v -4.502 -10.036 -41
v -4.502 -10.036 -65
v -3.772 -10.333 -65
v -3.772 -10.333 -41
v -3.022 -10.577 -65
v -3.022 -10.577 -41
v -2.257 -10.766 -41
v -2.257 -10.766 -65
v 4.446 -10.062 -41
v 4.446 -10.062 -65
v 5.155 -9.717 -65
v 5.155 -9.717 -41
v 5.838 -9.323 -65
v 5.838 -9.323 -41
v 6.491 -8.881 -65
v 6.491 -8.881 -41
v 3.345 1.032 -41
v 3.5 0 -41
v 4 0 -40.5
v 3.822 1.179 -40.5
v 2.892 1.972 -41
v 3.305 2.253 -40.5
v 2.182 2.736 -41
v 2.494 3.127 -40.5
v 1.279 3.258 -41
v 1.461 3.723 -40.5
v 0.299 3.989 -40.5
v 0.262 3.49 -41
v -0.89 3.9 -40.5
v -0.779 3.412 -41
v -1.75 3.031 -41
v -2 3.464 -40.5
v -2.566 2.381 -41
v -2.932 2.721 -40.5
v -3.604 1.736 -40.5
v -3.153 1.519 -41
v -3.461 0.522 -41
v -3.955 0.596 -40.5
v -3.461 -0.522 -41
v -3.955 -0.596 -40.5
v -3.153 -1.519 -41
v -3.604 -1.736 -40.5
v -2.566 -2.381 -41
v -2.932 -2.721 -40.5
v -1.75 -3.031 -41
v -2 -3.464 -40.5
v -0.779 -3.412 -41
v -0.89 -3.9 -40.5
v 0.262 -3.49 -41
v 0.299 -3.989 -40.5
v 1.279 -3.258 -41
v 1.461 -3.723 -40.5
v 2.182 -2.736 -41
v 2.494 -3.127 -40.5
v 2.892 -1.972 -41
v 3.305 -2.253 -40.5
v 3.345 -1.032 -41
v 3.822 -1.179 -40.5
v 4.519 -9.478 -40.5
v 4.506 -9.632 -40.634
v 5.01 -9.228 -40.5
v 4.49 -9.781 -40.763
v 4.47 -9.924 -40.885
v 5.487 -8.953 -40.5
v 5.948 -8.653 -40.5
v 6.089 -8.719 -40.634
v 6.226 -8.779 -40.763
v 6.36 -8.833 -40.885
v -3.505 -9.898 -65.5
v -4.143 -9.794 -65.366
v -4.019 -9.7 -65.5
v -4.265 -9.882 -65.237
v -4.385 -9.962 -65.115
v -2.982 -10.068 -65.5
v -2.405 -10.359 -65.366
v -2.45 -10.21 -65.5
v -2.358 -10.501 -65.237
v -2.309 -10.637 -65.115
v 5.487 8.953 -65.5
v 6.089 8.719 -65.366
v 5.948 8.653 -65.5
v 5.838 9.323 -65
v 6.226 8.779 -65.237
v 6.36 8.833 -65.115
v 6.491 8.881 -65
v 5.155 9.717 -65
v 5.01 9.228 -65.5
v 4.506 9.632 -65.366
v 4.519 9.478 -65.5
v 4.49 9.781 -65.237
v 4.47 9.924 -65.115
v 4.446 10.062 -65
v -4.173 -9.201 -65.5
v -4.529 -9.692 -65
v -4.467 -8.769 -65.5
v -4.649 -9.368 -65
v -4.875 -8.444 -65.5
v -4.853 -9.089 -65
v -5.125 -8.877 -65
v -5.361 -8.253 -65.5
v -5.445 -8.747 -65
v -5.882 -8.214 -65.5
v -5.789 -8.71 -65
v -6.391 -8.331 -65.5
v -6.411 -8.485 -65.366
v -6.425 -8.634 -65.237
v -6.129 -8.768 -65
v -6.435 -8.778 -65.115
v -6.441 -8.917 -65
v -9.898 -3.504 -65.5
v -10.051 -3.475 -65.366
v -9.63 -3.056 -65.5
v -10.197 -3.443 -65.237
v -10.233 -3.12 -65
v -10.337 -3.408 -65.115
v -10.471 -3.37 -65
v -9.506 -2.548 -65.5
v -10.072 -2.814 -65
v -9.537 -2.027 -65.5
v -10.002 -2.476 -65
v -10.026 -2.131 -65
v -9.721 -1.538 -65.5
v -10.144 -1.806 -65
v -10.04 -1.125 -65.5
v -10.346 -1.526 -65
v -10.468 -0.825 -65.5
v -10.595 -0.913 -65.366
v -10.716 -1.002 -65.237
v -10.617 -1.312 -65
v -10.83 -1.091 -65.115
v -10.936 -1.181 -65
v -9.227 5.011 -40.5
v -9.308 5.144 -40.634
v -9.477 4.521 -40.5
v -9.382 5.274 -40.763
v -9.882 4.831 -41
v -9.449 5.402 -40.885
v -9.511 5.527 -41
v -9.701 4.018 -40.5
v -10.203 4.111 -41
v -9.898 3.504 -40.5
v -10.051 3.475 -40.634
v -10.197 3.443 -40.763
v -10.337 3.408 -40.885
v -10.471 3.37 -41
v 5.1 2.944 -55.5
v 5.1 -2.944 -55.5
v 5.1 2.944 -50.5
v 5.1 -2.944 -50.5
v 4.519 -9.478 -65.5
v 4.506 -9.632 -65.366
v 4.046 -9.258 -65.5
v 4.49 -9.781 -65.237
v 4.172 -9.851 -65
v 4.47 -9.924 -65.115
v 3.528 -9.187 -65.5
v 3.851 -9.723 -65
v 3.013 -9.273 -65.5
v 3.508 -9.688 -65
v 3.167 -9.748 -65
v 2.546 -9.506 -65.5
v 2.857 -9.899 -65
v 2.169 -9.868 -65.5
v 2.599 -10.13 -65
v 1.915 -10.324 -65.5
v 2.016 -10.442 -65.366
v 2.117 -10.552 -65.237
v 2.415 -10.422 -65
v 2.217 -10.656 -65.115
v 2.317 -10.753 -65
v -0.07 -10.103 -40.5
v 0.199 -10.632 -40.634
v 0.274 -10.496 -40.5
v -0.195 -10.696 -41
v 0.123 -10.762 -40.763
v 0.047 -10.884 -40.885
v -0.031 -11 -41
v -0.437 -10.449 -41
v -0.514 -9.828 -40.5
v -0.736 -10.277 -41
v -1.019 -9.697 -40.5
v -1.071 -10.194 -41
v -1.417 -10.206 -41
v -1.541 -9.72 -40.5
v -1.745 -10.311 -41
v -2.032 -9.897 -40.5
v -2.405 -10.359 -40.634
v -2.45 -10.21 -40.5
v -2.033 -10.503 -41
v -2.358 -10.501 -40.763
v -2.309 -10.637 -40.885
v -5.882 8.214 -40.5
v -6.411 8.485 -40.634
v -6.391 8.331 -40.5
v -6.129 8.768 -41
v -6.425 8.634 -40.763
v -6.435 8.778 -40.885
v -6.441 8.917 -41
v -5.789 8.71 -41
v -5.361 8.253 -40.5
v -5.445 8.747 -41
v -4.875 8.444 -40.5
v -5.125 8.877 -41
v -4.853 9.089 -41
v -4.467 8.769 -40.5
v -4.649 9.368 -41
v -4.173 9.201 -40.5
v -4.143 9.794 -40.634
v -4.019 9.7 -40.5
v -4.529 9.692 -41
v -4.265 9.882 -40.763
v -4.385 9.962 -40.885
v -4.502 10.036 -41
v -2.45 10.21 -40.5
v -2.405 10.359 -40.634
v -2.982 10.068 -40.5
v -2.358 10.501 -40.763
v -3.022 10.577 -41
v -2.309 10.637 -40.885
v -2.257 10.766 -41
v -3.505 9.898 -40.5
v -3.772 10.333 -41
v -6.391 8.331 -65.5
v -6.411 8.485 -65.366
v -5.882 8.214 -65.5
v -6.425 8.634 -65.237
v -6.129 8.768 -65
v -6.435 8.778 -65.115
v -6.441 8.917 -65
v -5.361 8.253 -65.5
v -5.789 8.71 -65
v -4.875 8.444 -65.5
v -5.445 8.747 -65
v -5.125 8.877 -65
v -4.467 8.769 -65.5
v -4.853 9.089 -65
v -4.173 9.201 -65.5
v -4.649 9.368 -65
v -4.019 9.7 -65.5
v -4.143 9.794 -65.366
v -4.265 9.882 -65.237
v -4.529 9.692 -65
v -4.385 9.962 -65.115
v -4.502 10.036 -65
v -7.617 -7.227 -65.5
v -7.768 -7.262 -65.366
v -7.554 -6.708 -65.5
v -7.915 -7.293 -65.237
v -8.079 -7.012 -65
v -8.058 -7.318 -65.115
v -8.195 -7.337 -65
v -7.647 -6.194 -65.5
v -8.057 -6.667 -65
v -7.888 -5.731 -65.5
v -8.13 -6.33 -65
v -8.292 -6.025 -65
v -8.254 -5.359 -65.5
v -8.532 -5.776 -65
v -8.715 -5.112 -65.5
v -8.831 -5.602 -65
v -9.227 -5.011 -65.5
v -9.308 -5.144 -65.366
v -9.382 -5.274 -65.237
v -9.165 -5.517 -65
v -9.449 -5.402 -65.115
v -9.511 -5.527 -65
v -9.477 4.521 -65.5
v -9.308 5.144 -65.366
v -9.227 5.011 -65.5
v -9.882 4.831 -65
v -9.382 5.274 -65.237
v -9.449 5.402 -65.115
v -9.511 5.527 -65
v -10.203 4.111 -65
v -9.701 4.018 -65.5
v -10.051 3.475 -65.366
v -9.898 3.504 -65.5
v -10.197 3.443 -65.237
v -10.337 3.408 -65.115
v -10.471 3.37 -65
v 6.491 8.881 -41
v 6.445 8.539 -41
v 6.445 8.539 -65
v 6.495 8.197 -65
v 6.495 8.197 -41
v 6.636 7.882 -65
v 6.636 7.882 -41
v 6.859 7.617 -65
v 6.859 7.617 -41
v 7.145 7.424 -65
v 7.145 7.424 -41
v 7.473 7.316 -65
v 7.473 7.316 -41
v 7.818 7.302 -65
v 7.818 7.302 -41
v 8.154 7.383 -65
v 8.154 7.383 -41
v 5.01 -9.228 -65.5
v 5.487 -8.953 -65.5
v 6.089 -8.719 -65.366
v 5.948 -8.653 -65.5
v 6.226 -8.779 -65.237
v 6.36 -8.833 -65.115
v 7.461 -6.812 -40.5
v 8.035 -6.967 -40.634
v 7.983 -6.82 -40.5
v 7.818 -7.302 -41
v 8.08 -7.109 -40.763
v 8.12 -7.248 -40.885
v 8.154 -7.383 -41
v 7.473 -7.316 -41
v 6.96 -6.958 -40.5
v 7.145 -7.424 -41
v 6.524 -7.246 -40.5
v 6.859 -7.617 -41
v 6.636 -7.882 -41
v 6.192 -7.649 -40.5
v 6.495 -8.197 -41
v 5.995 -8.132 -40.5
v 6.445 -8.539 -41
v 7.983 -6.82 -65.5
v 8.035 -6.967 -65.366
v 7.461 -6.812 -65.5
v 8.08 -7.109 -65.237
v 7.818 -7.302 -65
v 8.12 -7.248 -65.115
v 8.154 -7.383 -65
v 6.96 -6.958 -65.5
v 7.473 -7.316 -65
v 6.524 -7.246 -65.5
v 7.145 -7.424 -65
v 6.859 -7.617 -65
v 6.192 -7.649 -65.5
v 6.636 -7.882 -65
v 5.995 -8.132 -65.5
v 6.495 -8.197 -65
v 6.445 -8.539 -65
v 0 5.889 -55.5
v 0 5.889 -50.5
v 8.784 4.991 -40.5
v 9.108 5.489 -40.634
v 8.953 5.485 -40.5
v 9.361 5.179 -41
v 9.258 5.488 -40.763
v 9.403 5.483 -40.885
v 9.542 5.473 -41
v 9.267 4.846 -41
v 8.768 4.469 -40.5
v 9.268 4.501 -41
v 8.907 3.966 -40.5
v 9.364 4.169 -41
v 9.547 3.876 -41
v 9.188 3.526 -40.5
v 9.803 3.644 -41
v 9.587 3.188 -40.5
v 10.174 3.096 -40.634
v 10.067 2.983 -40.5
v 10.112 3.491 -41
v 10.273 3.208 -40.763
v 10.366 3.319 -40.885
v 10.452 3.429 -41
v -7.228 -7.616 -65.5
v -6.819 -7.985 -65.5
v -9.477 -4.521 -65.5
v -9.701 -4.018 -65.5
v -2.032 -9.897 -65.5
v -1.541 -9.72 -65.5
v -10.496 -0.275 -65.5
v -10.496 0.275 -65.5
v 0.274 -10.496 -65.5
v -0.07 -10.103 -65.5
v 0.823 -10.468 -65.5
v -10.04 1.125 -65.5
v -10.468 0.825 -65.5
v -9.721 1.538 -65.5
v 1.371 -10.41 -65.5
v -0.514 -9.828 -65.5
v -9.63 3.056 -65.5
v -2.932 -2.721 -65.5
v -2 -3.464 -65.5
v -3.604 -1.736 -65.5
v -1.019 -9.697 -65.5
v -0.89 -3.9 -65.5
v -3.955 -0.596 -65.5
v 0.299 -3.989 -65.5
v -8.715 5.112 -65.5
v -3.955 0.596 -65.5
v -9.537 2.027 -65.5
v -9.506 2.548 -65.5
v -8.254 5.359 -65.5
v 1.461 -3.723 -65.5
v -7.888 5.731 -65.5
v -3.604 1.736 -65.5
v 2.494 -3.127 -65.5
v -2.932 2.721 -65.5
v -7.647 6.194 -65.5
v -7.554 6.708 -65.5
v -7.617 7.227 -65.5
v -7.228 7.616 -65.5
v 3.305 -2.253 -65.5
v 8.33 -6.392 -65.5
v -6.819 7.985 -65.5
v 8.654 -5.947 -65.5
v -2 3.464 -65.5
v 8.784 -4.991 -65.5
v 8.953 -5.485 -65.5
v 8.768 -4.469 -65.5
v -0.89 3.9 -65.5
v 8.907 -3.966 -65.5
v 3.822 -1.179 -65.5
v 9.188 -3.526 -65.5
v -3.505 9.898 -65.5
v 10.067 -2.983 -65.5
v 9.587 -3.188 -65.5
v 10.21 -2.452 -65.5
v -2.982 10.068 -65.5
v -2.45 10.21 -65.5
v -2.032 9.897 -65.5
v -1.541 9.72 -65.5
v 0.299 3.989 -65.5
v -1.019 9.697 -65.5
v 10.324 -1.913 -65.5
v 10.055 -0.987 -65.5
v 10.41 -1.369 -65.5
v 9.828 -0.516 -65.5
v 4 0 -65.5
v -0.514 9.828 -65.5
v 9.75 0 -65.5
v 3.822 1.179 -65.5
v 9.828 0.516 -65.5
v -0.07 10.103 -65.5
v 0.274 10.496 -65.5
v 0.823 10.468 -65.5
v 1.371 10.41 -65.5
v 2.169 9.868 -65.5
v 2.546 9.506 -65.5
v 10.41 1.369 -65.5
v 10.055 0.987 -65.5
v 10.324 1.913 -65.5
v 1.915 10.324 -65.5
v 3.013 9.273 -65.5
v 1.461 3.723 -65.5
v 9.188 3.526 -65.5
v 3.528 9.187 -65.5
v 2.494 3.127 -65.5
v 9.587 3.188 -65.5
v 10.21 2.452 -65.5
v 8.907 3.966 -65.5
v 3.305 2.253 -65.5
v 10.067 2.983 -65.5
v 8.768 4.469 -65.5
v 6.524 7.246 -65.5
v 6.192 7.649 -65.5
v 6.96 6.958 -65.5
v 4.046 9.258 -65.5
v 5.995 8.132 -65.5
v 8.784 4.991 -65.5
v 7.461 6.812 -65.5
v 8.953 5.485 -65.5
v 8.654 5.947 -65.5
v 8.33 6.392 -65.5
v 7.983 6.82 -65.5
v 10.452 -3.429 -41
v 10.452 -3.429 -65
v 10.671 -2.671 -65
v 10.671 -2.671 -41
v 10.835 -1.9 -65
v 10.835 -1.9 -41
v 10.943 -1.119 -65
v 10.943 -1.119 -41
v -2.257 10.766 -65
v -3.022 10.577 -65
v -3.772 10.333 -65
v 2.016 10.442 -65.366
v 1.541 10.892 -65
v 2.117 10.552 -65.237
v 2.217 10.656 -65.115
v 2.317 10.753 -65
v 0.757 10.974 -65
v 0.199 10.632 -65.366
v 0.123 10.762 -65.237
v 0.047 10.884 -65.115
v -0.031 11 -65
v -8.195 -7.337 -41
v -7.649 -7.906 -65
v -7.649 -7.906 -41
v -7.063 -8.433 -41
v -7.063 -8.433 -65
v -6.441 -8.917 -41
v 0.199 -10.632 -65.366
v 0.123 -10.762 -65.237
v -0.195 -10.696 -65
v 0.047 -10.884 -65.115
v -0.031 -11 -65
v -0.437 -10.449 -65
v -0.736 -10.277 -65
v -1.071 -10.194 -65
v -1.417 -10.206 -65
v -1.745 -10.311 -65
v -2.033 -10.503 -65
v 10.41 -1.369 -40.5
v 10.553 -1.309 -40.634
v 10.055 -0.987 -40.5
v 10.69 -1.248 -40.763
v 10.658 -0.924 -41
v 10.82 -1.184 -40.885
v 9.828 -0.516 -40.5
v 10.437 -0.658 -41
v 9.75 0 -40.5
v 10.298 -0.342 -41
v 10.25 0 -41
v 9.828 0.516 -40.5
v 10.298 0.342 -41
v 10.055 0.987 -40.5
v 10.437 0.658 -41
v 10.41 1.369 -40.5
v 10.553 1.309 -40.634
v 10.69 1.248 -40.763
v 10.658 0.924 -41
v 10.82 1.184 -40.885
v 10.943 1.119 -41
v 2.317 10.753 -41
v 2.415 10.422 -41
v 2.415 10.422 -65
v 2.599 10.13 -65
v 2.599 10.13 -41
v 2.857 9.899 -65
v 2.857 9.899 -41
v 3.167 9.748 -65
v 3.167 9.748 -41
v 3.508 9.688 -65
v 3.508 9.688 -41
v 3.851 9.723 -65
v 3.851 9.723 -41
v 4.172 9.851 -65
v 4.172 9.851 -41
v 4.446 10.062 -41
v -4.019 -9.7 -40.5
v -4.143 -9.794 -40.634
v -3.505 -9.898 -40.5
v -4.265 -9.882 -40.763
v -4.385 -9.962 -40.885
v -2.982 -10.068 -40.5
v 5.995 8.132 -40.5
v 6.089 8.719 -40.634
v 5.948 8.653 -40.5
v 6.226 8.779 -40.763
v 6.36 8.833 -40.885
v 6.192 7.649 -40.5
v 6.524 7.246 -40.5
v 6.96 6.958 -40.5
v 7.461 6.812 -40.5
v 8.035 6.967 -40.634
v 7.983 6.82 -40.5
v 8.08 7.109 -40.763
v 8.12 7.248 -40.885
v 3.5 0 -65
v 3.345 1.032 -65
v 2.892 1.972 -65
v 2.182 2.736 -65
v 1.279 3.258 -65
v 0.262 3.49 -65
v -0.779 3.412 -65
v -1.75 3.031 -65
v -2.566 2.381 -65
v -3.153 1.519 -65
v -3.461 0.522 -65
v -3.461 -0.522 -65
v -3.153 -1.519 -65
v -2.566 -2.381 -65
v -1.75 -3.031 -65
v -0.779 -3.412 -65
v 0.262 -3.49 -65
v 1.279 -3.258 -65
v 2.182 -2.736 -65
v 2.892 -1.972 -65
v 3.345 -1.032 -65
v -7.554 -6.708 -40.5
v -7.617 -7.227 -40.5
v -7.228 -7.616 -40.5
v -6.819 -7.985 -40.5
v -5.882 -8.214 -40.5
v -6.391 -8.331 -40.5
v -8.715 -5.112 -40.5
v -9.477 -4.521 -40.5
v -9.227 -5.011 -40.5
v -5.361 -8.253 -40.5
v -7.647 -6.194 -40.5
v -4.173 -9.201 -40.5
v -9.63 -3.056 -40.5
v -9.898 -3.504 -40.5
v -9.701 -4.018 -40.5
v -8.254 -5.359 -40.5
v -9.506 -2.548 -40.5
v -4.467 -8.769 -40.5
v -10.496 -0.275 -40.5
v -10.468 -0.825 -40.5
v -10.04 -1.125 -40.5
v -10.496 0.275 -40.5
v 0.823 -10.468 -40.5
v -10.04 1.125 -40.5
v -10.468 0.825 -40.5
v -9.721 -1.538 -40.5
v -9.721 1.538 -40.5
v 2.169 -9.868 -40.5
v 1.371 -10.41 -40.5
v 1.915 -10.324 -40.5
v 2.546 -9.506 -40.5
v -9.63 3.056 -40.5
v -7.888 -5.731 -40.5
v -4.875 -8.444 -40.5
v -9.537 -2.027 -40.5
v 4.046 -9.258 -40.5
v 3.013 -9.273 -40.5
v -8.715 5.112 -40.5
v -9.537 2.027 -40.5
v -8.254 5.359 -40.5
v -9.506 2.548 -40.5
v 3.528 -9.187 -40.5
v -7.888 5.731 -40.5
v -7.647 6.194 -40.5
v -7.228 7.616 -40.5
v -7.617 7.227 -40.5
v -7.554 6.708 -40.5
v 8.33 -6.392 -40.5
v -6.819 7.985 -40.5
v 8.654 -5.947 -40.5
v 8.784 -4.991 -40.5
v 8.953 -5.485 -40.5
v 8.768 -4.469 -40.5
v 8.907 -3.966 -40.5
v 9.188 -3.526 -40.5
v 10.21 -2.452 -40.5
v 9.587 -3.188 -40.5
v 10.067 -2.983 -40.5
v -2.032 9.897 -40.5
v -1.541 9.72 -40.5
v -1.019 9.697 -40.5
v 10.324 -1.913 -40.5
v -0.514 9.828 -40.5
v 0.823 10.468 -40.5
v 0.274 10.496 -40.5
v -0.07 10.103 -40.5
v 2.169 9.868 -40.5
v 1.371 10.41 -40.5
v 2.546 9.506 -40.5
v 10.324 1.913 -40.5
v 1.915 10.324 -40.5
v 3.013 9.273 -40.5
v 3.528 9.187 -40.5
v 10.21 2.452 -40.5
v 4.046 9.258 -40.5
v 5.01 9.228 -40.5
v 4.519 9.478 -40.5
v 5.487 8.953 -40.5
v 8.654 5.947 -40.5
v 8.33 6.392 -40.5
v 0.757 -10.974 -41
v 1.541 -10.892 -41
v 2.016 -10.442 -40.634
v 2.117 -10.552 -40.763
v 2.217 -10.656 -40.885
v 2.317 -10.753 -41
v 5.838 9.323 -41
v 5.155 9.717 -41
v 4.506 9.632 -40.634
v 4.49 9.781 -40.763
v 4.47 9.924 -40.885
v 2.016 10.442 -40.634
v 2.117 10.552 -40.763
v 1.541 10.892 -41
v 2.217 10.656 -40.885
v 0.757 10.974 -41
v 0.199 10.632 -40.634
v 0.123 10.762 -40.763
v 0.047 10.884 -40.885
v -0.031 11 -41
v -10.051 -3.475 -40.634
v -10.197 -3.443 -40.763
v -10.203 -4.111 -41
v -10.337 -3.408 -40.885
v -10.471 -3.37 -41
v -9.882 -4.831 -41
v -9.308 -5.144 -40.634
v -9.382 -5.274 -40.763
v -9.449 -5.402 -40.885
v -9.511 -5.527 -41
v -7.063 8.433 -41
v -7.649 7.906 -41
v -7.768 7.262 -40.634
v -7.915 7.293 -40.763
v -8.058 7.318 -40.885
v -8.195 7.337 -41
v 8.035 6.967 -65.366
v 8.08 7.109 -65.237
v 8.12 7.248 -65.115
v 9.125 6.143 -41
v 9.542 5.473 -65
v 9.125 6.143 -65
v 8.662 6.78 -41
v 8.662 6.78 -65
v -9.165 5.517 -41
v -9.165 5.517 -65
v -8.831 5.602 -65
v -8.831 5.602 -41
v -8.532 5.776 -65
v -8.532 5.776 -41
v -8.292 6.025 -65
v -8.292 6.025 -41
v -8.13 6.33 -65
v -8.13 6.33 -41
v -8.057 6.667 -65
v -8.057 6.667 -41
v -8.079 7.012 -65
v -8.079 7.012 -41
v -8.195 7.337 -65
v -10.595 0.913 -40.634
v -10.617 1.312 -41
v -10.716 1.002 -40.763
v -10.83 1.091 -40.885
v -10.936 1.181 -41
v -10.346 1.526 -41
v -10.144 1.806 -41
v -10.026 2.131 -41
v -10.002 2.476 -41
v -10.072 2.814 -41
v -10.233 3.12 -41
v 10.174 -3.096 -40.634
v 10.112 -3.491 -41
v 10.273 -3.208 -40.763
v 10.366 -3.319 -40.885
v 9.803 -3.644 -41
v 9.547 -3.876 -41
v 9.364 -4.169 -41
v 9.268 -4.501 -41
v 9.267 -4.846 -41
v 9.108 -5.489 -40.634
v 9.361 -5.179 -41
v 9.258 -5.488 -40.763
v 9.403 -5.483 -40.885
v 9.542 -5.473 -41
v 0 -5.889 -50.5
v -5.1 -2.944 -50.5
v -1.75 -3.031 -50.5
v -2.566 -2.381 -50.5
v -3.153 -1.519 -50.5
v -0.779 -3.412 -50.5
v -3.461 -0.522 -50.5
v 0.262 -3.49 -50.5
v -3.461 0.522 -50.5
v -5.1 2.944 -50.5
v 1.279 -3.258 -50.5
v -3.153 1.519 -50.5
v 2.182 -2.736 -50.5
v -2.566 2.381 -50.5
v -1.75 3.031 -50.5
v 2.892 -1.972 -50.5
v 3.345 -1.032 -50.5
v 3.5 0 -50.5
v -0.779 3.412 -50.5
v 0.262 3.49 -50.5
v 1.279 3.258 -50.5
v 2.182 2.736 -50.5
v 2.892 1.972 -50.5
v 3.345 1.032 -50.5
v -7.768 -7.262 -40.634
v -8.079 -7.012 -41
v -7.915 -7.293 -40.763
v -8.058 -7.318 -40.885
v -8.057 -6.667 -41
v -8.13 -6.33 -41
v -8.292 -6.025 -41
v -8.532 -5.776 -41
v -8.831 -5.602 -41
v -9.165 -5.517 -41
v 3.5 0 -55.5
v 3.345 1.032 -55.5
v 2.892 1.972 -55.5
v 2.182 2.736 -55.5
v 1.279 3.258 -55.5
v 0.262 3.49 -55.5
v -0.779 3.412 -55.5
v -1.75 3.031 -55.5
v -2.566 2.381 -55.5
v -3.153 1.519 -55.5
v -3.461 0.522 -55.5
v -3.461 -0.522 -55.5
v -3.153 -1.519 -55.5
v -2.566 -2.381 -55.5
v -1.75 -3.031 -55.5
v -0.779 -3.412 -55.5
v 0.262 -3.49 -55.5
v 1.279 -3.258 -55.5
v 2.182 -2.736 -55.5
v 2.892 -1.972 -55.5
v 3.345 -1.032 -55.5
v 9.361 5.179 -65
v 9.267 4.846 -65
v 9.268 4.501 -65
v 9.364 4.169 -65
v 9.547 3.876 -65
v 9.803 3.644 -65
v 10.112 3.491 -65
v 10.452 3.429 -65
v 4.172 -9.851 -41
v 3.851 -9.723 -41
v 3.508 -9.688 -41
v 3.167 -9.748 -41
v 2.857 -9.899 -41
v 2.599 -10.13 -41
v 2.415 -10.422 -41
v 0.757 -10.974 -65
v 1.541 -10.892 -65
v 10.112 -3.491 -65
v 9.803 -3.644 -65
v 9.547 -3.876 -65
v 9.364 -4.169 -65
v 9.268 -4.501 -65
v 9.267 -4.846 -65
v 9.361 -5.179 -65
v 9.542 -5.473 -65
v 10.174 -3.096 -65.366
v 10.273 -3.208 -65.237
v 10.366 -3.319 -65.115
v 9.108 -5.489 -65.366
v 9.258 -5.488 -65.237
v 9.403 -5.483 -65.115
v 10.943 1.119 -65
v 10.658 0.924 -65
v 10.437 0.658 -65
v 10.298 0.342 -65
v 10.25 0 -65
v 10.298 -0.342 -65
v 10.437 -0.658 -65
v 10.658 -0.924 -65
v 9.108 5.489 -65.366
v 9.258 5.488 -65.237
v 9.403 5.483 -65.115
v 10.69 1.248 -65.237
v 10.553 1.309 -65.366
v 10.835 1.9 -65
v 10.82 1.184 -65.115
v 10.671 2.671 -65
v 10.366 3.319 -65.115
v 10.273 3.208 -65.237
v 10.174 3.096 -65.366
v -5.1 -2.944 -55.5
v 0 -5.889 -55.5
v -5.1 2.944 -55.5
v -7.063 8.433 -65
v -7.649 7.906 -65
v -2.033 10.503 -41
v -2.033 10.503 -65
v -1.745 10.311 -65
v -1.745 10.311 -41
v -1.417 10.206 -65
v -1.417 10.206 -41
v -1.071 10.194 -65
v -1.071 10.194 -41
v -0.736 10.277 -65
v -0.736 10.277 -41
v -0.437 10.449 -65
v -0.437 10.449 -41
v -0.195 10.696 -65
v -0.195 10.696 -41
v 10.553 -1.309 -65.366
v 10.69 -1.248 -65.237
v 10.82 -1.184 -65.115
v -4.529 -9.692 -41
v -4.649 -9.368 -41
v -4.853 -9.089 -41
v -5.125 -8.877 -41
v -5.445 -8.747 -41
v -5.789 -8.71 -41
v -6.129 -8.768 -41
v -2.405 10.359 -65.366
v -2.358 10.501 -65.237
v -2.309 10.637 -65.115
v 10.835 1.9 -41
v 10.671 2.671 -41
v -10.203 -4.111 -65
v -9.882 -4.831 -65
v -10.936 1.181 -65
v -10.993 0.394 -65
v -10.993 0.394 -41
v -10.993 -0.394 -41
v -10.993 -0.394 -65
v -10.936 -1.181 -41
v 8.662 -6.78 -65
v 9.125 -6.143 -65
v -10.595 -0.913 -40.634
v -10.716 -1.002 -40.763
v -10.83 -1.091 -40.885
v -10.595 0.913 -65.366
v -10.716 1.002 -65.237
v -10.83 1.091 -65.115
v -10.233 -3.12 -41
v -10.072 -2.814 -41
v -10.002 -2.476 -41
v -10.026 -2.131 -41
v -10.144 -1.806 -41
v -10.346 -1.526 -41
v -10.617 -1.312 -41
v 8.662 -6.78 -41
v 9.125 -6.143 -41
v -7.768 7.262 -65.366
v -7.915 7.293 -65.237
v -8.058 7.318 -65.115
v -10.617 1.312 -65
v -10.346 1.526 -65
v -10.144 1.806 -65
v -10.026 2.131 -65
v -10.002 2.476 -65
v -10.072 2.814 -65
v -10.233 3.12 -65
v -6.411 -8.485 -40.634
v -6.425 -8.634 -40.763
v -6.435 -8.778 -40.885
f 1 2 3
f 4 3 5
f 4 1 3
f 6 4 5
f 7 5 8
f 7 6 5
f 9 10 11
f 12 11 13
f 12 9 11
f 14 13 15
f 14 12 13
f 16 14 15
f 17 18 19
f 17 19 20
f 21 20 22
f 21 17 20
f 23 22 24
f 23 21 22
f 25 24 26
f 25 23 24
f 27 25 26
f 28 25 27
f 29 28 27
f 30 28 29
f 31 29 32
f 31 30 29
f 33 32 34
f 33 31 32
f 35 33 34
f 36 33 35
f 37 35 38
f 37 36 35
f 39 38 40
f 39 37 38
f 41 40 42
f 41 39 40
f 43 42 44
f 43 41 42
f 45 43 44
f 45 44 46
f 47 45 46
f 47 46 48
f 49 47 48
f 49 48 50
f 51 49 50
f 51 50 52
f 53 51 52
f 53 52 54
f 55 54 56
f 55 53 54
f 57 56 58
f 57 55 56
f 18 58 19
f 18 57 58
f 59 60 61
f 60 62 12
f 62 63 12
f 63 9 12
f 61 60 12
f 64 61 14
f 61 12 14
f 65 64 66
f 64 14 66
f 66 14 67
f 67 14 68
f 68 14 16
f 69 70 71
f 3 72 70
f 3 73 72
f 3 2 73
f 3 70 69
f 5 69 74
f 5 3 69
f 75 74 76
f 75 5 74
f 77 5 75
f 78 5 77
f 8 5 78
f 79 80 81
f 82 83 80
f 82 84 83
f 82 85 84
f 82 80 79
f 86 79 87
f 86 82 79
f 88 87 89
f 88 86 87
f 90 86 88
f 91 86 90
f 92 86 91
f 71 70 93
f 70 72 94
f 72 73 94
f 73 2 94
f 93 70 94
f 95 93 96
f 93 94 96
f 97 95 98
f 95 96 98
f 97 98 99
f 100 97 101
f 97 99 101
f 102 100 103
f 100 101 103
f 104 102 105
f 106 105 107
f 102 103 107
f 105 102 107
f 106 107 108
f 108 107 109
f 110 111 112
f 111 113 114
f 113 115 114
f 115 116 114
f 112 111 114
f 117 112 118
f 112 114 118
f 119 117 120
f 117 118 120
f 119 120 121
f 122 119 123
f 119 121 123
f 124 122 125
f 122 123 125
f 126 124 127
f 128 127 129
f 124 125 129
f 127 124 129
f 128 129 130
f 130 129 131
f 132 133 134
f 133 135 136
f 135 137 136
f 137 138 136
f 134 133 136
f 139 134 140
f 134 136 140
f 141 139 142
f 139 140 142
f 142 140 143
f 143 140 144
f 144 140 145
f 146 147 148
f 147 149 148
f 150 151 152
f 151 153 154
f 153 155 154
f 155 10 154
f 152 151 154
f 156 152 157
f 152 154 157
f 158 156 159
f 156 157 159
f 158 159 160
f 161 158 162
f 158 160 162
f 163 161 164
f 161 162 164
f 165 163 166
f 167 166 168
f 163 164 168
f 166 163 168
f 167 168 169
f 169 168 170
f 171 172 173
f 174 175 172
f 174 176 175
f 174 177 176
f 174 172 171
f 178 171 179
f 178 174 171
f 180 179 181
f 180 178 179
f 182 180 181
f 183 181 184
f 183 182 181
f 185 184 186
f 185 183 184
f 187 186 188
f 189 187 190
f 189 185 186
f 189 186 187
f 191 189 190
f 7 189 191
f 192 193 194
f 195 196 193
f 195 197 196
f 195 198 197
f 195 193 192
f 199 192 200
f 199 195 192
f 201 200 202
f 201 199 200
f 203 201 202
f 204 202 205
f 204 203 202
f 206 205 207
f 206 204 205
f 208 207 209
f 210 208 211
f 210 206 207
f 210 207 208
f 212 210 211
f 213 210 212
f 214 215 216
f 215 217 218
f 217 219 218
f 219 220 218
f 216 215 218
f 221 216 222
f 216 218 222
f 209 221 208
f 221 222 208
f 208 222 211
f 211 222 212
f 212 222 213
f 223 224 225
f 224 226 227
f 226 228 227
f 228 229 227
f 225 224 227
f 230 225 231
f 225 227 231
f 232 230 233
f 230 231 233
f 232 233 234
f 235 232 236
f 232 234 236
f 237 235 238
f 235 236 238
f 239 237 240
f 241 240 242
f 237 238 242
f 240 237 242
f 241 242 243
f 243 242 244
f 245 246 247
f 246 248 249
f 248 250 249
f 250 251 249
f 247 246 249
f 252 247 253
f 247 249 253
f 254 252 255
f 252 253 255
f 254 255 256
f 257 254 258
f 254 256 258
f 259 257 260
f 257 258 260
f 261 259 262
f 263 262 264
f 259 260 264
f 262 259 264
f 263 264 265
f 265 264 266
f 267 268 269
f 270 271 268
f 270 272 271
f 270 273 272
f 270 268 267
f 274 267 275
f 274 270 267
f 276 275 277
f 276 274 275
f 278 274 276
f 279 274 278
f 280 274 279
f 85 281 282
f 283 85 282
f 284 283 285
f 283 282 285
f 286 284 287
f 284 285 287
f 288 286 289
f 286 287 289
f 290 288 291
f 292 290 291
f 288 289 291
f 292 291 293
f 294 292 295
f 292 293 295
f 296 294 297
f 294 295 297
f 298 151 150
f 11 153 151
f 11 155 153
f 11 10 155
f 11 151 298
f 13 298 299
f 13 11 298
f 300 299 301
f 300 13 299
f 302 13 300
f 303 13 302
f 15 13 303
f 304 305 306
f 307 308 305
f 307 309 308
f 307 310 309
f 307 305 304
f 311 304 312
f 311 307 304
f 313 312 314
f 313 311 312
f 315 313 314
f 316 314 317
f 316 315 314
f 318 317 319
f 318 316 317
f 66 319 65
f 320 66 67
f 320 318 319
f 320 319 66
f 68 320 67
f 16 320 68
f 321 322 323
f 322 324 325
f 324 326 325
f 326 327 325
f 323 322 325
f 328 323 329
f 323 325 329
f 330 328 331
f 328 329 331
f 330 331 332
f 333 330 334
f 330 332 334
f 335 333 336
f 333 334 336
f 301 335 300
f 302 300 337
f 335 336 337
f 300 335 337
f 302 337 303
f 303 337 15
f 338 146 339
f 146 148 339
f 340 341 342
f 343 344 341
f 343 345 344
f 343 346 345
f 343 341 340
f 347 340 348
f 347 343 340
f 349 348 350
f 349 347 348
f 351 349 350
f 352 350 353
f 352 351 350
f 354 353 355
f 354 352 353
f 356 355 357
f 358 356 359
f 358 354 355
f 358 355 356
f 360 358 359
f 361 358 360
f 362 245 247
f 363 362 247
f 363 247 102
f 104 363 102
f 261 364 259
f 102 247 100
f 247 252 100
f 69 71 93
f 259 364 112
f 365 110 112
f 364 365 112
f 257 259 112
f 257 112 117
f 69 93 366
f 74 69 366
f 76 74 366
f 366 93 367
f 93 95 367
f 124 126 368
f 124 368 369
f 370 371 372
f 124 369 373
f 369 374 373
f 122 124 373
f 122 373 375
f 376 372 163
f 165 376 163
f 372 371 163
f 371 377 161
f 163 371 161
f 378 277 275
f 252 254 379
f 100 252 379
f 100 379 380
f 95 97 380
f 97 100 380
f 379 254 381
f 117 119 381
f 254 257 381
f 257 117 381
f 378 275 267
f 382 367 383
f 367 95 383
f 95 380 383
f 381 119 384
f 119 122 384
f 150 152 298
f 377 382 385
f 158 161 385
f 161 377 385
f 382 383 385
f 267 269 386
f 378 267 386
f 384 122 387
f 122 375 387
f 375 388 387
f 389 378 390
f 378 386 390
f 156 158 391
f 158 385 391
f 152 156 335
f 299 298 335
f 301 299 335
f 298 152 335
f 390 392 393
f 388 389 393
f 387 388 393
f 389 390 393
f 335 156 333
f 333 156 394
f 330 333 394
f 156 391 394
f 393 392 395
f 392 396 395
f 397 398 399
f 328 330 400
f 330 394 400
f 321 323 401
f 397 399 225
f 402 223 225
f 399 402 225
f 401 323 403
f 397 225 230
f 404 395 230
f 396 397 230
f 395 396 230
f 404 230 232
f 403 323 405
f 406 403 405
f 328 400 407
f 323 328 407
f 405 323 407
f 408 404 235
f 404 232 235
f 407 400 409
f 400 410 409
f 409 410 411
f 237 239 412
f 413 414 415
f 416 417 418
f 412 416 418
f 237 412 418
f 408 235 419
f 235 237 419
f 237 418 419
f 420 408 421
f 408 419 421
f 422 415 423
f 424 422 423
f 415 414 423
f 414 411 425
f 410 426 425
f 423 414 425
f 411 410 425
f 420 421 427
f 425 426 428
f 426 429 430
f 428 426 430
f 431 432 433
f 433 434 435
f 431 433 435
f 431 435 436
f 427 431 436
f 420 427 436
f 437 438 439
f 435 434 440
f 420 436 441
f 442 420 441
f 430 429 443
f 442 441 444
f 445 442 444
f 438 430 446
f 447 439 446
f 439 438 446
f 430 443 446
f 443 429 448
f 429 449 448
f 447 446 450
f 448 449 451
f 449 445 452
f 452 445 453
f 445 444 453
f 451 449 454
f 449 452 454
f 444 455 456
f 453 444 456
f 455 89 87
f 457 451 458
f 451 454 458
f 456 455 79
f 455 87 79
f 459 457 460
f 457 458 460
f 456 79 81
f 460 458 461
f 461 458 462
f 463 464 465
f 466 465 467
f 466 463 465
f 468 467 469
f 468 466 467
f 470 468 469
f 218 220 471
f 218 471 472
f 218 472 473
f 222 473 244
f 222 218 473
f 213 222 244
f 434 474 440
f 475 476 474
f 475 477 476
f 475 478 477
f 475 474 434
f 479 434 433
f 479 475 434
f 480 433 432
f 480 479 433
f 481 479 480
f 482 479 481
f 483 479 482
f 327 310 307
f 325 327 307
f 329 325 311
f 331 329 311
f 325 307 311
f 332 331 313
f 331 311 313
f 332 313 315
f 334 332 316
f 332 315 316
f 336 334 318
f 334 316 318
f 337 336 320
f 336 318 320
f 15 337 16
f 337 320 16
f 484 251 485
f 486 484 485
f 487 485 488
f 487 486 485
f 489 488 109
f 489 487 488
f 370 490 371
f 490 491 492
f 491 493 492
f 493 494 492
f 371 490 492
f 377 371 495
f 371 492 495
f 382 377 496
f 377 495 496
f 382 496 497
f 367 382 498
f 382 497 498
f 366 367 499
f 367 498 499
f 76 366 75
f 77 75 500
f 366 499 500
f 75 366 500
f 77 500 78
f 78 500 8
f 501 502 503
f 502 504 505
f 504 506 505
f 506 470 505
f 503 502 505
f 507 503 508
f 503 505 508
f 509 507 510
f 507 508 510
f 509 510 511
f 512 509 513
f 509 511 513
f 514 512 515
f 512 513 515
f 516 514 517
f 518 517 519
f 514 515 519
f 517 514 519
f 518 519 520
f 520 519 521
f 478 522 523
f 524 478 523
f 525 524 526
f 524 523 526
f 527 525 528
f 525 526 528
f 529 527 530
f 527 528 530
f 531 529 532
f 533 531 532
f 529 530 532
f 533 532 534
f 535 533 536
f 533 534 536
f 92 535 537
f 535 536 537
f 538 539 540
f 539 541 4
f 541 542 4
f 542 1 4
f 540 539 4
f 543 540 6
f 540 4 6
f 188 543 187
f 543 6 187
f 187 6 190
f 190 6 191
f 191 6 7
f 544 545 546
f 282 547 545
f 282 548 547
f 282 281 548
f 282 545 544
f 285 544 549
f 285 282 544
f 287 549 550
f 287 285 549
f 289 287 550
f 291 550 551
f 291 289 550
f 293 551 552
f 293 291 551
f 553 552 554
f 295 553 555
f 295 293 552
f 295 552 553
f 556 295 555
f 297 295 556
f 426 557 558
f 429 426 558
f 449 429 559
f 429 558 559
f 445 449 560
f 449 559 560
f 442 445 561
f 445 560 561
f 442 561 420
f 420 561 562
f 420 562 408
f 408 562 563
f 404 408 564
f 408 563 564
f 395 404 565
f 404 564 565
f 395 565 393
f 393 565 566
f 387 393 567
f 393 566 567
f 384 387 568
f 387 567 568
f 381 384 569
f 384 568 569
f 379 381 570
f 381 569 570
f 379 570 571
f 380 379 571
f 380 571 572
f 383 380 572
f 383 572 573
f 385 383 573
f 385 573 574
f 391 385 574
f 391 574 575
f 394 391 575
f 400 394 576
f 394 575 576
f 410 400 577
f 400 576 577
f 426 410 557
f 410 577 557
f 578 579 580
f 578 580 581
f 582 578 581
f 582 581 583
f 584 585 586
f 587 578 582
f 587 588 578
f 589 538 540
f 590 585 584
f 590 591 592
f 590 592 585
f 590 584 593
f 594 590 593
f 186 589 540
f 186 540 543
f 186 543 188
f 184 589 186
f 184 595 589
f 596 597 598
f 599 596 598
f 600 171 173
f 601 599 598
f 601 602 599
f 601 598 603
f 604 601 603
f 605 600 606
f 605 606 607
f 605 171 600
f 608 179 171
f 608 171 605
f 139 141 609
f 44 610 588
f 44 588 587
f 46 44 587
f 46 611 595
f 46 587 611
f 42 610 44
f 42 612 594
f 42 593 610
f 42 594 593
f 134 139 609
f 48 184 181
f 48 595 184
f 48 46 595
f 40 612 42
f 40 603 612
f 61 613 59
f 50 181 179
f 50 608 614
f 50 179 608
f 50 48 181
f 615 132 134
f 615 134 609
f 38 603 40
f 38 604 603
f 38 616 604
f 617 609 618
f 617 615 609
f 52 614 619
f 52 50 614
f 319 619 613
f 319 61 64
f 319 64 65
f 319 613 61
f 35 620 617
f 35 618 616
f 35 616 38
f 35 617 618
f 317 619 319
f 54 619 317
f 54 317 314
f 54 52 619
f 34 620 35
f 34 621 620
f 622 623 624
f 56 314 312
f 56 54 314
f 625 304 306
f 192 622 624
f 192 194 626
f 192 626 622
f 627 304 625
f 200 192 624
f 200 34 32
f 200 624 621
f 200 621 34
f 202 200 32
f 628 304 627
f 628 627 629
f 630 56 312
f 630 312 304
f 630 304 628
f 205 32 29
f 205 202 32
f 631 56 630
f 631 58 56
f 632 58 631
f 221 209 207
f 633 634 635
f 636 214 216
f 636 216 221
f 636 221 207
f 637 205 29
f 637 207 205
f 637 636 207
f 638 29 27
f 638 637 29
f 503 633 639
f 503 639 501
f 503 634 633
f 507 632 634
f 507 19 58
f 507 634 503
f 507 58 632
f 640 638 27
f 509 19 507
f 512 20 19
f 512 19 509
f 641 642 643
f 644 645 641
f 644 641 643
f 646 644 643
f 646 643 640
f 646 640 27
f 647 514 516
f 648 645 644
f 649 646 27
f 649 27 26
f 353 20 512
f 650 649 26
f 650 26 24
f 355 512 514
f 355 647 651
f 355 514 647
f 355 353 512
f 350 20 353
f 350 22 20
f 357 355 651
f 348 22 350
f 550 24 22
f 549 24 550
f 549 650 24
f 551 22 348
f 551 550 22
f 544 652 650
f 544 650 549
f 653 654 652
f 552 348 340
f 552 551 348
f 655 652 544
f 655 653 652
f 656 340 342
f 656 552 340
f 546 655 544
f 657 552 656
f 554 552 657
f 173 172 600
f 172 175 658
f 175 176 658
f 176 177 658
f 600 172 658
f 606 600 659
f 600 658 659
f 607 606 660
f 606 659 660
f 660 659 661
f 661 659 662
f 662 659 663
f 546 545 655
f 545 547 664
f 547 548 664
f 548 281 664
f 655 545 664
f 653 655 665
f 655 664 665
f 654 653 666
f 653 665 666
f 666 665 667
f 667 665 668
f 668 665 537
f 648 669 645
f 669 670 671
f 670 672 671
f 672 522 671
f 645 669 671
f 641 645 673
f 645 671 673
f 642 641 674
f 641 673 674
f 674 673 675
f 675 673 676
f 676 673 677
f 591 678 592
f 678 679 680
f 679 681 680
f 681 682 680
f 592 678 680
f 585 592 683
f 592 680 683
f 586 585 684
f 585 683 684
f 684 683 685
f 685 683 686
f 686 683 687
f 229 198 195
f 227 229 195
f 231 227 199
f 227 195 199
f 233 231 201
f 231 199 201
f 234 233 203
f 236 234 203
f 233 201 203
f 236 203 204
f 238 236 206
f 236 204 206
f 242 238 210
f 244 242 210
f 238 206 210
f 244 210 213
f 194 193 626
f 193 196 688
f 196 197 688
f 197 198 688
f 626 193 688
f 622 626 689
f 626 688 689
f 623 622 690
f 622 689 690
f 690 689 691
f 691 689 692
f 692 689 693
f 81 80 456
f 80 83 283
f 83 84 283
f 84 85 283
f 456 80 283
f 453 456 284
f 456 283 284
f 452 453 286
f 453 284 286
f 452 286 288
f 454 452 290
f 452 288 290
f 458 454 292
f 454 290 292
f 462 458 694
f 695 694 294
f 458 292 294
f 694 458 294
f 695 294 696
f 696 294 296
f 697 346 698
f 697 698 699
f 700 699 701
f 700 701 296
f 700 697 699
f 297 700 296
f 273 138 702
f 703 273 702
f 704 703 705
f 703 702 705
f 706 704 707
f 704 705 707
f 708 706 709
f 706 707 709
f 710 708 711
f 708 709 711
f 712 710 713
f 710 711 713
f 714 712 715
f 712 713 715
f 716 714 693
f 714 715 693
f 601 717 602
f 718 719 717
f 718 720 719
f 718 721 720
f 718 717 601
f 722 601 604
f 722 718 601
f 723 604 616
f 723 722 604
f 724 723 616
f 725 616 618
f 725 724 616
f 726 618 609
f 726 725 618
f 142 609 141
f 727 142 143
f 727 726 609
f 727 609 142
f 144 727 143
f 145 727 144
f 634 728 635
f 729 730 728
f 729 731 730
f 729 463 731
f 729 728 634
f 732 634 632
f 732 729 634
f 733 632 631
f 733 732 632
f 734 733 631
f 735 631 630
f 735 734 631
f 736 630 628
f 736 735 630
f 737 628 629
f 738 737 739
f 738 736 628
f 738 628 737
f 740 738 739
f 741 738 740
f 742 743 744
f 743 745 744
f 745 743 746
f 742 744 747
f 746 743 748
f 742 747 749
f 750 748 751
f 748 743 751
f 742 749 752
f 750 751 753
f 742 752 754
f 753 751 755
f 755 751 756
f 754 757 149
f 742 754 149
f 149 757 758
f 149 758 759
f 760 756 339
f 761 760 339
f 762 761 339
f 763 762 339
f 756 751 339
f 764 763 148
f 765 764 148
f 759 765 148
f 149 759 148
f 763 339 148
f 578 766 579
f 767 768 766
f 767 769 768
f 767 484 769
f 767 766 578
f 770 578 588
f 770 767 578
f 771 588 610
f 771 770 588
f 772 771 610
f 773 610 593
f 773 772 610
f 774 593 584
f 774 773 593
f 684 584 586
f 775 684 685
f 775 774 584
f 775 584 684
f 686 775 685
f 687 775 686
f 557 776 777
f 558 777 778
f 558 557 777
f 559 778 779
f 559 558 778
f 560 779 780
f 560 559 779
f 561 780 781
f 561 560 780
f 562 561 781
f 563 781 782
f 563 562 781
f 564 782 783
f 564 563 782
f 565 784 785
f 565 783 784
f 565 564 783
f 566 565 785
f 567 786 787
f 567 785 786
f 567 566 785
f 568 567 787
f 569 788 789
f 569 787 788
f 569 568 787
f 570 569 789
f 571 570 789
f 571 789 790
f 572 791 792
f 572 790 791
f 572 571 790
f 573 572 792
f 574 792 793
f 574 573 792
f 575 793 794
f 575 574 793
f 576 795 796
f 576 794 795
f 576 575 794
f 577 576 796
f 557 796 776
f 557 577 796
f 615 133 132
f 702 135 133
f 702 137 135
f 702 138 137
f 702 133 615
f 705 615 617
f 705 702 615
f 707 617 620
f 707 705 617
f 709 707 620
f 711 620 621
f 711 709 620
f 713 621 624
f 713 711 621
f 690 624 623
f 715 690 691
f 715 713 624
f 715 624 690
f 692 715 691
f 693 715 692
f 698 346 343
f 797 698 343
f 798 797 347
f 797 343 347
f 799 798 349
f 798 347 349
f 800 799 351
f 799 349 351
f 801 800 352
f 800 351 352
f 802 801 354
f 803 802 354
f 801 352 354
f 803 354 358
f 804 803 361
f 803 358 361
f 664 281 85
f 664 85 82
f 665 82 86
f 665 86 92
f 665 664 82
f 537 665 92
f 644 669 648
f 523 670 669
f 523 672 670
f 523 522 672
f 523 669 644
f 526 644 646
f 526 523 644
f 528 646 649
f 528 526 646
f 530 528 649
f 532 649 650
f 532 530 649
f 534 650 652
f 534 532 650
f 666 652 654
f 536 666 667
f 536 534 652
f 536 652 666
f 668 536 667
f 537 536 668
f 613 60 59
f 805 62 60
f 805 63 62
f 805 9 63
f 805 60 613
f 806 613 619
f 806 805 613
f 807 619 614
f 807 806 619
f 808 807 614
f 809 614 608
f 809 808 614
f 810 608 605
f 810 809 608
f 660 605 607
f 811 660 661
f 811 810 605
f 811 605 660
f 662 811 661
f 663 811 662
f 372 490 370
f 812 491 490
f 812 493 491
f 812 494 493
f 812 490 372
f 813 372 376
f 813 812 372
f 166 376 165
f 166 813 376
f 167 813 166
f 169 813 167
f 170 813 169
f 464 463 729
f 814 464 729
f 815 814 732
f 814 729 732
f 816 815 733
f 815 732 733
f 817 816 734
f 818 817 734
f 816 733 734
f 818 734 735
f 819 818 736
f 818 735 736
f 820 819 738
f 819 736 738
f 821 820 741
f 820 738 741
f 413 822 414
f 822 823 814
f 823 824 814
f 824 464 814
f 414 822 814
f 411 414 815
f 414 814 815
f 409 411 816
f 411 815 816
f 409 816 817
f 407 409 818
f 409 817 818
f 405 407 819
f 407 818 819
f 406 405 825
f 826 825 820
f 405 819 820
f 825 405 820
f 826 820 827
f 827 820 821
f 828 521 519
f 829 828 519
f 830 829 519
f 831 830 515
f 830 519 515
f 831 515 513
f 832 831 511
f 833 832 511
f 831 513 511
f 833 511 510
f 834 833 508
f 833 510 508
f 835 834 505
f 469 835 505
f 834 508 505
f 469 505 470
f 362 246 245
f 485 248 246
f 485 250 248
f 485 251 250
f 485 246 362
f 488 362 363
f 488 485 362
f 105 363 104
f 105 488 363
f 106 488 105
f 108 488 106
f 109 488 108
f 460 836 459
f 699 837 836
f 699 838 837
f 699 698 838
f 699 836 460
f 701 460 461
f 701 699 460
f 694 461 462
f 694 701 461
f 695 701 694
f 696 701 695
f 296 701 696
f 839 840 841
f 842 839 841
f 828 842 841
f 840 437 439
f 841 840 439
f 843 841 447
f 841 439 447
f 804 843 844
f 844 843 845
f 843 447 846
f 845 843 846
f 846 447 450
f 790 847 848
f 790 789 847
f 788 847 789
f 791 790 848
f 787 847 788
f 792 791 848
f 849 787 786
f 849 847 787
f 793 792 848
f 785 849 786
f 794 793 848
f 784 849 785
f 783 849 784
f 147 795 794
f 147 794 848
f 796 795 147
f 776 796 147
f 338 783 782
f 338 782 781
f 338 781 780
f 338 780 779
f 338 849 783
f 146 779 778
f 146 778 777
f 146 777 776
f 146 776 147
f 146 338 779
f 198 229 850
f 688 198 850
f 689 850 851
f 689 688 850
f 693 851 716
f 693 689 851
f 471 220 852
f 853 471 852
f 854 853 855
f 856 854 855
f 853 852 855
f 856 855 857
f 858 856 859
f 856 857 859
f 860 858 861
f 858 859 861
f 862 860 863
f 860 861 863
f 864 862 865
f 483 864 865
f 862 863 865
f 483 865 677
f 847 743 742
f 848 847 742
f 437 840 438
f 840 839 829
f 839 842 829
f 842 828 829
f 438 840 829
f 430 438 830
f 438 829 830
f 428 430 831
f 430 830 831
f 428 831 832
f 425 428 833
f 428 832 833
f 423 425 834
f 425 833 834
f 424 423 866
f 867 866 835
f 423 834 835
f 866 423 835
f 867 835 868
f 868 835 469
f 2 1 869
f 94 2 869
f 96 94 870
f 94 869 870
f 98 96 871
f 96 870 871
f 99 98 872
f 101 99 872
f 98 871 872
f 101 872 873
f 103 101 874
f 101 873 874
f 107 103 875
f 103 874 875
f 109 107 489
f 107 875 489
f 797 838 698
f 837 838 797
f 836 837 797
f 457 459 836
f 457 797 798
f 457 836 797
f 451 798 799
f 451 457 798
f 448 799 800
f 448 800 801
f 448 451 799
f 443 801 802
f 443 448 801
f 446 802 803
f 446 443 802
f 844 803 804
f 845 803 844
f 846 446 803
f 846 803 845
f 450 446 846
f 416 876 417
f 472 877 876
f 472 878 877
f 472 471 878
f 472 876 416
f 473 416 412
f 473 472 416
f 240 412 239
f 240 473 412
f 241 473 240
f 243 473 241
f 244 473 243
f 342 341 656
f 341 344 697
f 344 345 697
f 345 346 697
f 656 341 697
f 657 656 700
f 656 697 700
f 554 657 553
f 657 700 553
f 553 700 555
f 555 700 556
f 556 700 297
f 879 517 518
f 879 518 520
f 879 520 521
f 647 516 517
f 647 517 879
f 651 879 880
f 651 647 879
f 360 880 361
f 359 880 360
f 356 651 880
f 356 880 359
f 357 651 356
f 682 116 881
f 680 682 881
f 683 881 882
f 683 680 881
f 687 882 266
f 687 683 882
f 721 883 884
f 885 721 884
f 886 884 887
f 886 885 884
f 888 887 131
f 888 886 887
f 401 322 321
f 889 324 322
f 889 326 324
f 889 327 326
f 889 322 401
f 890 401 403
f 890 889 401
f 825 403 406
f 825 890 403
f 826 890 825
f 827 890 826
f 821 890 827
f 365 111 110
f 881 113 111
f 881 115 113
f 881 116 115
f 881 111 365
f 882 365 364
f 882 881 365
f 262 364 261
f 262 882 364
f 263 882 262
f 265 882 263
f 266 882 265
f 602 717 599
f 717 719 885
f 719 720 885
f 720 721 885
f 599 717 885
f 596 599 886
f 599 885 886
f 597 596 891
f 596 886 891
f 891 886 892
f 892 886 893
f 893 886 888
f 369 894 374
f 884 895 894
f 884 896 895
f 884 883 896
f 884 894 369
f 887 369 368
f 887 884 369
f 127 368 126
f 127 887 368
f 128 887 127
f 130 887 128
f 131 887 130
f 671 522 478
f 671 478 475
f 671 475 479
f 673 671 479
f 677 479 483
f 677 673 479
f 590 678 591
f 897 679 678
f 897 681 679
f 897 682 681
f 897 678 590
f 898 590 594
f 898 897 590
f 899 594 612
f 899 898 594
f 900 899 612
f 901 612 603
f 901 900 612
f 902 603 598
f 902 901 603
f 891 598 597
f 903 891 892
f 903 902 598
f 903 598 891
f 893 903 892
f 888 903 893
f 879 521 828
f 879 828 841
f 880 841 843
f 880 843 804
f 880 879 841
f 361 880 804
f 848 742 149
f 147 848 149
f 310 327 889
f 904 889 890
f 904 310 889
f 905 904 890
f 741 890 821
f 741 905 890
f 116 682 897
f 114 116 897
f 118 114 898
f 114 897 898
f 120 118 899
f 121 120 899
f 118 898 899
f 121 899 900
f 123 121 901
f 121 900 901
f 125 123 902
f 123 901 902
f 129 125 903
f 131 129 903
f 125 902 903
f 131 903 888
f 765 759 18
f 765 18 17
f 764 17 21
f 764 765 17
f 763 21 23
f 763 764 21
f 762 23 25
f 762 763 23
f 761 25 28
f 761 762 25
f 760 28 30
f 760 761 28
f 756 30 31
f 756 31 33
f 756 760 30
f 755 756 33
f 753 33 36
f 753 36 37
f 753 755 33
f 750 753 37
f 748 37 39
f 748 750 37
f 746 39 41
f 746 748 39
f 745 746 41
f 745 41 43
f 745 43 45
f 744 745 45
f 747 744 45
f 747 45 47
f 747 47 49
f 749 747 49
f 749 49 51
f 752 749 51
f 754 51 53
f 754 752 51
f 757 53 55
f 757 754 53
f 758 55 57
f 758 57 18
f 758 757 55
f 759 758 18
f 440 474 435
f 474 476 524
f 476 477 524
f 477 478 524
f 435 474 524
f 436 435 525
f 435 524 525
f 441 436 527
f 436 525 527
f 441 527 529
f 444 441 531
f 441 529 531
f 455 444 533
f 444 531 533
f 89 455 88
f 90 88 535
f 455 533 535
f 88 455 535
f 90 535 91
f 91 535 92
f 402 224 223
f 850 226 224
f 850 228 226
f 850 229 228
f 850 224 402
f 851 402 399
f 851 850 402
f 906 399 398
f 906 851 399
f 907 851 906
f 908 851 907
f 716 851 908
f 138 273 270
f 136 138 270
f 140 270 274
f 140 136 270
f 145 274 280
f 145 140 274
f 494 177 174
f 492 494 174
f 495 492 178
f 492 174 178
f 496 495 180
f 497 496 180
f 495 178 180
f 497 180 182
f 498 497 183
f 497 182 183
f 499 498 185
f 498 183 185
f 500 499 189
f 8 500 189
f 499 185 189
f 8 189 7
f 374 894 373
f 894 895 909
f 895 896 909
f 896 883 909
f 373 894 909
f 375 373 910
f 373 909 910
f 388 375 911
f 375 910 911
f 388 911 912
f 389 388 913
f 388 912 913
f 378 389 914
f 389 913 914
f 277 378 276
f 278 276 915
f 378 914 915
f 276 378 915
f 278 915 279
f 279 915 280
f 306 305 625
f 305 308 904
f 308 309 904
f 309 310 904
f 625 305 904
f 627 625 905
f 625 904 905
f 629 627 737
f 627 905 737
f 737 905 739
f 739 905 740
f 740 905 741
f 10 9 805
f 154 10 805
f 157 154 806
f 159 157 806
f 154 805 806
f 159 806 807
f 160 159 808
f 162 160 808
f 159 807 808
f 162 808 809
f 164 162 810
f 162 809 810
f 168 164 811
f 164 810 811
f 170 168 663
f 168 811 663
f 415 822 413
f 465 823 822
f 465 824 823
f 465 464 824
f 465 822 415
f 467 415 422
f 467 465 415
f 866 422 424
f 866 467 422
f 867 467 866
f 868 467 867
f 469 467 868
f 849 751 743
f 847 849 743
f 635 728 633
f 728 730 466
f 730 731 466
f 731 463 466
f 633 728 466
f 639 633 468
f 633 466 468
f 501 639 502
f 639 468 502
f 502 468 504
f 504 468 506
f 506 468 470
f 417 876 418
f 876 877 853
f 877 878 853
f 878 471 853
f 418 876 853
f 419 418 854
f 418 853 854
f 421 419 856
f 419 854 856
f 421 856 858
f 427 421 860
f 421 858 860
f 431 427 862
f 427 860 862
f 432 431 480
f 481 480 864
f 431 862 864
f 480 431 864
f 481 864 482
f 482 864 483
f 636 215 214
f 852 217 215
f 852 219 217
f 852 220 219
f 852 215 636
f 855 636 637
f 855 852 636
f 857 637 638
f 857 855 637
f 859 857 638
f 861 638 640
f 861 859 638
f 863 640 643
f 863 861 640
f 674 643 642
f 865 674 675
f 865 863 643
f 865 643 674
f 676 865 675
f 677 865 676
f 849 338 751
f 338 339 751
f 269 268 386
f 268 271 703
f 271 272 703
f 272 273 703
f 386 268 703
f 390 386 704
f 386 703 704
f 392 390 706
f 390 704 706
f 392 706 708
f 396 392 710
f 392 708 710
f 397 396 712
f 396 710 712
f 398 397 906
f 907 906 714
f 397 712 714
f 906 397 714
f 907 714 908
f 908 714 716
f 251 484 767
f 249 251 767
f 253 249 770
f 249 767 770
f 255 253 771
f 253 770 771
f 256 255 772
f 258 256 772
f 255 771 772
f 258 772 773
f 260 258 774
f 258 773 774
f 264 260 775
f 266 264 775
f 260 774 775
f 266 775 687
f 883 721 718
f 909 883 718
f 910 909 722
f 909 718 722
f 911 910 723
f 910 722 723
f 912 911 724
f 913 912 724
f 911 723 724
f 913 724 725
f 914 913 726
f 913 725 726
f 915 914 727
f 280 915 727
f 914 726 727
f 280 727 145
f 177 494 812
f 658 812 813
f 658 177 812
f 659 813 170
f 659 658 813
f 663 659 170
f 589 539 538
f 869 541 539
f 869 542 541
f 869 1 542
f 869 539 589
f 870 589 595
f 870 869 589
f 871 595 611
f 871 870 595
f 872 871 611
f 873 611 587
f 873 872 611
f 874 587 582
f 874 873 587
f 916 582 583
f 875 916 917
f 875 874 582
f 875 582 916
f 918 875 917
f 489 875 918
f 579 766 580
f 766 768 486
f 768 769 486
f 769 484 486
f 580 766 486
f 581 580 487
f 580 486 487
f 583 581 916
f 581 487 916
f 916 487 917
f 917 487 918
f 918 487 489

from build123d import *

# Parameters (mm, degrees)
SKETCH011_R          = 11
SKETCH011_R_2        = 3.5
PAD006_DEPTH         = 12.5
POCKET003_DEPTH      = 2.5
SKETCH013_R          = 1.25
POCKET004_DEPTH      = 92.325808
POCKET004_DEPTH_BACK = 92.325808
POLARPATTERN_COUNT   = 15
CHAMFER_SIZE         = 0.5


with BuildPart() as part:
    # Sketch011 → Pad006 (new body, symmetric)
    with BuildSketch(Plane.XY):
        Circle(SKETCH011_R)
        Circle(SKETCH011_R_2, mode=Mode.SUBTRACT)
    extrude(amount=PAD006_DEPTH, both=True)

    # Sketch012 → Pocket003 (cut, symmetric)
    with BuildSketch(Plane.XY):
        Polygon((0, 5.888973), (-5.1, 2.944486), (-5.1, -2.944486), (0, -5.888973), (5.1, -2.944486), (5.1, 2.944486), align=None)
    extrude(amount=POCKET003_DEPTH, both=True, mode=Mode.SUBTRACT)

    # Sketch013 → Pocket004 (cut, two sides)
    with BuildSketch(Plane.XY) as pocket004_sk:
        with Locations((11.5, 0)):
            Circle(SKETCH013_R)
    pocket004 = extrude(amount=-POCKET004_DEPTH, mode=Mode.SUBTRACT) + extrude(pocket004_sk.sketch, amount=POCKET004_DEPTH_BACK, mode=Mode.SUBTRACT)

    # PolarPattern: Pocket004 ×15 about axis
    polarpattern_axis = Axis((0, 0, 0), (0, 0, 1))
    for i in range(1, POLARPATTERN_COUNT):
        add(pocket004.rotate(polarpattern_axis, i * 360 / POLARPATTERN_COUNT), mode=Mode.SUBTRACT)

    # Chamfer
    chamfer_edges = [part.edges().sort_by_distance(p)[0] for p in [
        (10.25, 0, 12.5),
        (10.759624, -2.287029, 12.5),
        (9.363841, -4.169051, 12.5),
        (8.899187, -6.465638, 12.5),
        (6.858589, -7.617234, 12.5),
        (5.5, -9.526279, 12.5),
        (3.167424, -9.748329, 12.5),
        (1.149813, -10.939741, 12.5),
        (-1.071417, -10.193849, 12.5),
        (-3.399187, -10.461622, 12.5),
        (-5.125, -8.87676, 12.5),
        (-7.360437, -8.174593, 12.5),
        (-8.292424, -6.024799, 12.5),
        (-10.049, -4.474103, 12.5),
        (-10.026013, -2.131095, 12.5),
        (-11, 0, 12.5),
        (-10.026013, 2.131095, 12.5),
        (-10.049, 4.474103, 12.5),
        (-8.292424, 6.024799, 12.5),
        (-7.360437, 8.174593, 12.5),
        (-5.125, 8.87676, 12.5),
        (-3.399187, 10.461622, 12.5),
        (-1.071417, 10.193849, 12.5),
        (1.149813, 10.939741, 12.5),
        (3.167424, 9.748329, 12.5),
        (5.5, 9.526279, 12.5),
        (6.858589, 7.617234, 12.5),
        (8.899187, 6.465638, 12.5),
        (9.363841, 4.169051, 12.5),
        (10.759624, 2.287029, 12.5),
        (-3.5, 0, 12.5),
        (10.25, 0, -12.5),
        (10.759624, -2.287029, -12.5),
        (9.363841, -4.169051, -12.5),
        (8.899187, -6.465638, -12.5),
        (6.858589, -7.617234, -12.5),
        (5.5, -9.526279, -12.5),
        (3.167424, -9.748329, -12.5),
        (1.149813, -10.939741, -12.5),
        (-1.071417, -10.193849, -12.5),
        (-3.399187, -10.461622, -12.5),
        (-5.125, -8.87676, -12.5),
        (-7.360437, -8.174593, -12.5),
        (-8.292424, -6.024799, -12.5),
        (-10.049, -4.474103, -12.5),
        (-10.026013, -2.131095, -12.5),
        (-11, 0, -12.5),
        (-10.026013, 2.131095, -12.5),
        (-10.049, 4.474103, -12.5),
        (-8.292424, 6.024799, -12.5),
        (-7.360437, 8.174593, -12.5),
        (-5.125, 8.87676, -12.5),
        (-3.399187, 10.461622, -12.5),
        (-1.071417, 10.193849, -12.5),
        (1.149813, 10.939741, -12.5),
        (3.167424, 9.748329, -12.5),
        (5.5, 9.526279, -12.5),
        (6.858589, 7.617234, -12.5),
        (8.899187, 6.465638, -12.5),
        (9.363841, 4.169051, -12.5),
        (10.759624, 2.287029, -12.5),
        (-3.5, 0, -12.5),
    ]]
    chamfer(chamfer_edges, length=CHAMFER_SIZE)


with BuildPart() as part_1:
    # Body002 placement: moved
    add(part.part.moved(Location((0, 0, -53))))


solid = part_1.part
